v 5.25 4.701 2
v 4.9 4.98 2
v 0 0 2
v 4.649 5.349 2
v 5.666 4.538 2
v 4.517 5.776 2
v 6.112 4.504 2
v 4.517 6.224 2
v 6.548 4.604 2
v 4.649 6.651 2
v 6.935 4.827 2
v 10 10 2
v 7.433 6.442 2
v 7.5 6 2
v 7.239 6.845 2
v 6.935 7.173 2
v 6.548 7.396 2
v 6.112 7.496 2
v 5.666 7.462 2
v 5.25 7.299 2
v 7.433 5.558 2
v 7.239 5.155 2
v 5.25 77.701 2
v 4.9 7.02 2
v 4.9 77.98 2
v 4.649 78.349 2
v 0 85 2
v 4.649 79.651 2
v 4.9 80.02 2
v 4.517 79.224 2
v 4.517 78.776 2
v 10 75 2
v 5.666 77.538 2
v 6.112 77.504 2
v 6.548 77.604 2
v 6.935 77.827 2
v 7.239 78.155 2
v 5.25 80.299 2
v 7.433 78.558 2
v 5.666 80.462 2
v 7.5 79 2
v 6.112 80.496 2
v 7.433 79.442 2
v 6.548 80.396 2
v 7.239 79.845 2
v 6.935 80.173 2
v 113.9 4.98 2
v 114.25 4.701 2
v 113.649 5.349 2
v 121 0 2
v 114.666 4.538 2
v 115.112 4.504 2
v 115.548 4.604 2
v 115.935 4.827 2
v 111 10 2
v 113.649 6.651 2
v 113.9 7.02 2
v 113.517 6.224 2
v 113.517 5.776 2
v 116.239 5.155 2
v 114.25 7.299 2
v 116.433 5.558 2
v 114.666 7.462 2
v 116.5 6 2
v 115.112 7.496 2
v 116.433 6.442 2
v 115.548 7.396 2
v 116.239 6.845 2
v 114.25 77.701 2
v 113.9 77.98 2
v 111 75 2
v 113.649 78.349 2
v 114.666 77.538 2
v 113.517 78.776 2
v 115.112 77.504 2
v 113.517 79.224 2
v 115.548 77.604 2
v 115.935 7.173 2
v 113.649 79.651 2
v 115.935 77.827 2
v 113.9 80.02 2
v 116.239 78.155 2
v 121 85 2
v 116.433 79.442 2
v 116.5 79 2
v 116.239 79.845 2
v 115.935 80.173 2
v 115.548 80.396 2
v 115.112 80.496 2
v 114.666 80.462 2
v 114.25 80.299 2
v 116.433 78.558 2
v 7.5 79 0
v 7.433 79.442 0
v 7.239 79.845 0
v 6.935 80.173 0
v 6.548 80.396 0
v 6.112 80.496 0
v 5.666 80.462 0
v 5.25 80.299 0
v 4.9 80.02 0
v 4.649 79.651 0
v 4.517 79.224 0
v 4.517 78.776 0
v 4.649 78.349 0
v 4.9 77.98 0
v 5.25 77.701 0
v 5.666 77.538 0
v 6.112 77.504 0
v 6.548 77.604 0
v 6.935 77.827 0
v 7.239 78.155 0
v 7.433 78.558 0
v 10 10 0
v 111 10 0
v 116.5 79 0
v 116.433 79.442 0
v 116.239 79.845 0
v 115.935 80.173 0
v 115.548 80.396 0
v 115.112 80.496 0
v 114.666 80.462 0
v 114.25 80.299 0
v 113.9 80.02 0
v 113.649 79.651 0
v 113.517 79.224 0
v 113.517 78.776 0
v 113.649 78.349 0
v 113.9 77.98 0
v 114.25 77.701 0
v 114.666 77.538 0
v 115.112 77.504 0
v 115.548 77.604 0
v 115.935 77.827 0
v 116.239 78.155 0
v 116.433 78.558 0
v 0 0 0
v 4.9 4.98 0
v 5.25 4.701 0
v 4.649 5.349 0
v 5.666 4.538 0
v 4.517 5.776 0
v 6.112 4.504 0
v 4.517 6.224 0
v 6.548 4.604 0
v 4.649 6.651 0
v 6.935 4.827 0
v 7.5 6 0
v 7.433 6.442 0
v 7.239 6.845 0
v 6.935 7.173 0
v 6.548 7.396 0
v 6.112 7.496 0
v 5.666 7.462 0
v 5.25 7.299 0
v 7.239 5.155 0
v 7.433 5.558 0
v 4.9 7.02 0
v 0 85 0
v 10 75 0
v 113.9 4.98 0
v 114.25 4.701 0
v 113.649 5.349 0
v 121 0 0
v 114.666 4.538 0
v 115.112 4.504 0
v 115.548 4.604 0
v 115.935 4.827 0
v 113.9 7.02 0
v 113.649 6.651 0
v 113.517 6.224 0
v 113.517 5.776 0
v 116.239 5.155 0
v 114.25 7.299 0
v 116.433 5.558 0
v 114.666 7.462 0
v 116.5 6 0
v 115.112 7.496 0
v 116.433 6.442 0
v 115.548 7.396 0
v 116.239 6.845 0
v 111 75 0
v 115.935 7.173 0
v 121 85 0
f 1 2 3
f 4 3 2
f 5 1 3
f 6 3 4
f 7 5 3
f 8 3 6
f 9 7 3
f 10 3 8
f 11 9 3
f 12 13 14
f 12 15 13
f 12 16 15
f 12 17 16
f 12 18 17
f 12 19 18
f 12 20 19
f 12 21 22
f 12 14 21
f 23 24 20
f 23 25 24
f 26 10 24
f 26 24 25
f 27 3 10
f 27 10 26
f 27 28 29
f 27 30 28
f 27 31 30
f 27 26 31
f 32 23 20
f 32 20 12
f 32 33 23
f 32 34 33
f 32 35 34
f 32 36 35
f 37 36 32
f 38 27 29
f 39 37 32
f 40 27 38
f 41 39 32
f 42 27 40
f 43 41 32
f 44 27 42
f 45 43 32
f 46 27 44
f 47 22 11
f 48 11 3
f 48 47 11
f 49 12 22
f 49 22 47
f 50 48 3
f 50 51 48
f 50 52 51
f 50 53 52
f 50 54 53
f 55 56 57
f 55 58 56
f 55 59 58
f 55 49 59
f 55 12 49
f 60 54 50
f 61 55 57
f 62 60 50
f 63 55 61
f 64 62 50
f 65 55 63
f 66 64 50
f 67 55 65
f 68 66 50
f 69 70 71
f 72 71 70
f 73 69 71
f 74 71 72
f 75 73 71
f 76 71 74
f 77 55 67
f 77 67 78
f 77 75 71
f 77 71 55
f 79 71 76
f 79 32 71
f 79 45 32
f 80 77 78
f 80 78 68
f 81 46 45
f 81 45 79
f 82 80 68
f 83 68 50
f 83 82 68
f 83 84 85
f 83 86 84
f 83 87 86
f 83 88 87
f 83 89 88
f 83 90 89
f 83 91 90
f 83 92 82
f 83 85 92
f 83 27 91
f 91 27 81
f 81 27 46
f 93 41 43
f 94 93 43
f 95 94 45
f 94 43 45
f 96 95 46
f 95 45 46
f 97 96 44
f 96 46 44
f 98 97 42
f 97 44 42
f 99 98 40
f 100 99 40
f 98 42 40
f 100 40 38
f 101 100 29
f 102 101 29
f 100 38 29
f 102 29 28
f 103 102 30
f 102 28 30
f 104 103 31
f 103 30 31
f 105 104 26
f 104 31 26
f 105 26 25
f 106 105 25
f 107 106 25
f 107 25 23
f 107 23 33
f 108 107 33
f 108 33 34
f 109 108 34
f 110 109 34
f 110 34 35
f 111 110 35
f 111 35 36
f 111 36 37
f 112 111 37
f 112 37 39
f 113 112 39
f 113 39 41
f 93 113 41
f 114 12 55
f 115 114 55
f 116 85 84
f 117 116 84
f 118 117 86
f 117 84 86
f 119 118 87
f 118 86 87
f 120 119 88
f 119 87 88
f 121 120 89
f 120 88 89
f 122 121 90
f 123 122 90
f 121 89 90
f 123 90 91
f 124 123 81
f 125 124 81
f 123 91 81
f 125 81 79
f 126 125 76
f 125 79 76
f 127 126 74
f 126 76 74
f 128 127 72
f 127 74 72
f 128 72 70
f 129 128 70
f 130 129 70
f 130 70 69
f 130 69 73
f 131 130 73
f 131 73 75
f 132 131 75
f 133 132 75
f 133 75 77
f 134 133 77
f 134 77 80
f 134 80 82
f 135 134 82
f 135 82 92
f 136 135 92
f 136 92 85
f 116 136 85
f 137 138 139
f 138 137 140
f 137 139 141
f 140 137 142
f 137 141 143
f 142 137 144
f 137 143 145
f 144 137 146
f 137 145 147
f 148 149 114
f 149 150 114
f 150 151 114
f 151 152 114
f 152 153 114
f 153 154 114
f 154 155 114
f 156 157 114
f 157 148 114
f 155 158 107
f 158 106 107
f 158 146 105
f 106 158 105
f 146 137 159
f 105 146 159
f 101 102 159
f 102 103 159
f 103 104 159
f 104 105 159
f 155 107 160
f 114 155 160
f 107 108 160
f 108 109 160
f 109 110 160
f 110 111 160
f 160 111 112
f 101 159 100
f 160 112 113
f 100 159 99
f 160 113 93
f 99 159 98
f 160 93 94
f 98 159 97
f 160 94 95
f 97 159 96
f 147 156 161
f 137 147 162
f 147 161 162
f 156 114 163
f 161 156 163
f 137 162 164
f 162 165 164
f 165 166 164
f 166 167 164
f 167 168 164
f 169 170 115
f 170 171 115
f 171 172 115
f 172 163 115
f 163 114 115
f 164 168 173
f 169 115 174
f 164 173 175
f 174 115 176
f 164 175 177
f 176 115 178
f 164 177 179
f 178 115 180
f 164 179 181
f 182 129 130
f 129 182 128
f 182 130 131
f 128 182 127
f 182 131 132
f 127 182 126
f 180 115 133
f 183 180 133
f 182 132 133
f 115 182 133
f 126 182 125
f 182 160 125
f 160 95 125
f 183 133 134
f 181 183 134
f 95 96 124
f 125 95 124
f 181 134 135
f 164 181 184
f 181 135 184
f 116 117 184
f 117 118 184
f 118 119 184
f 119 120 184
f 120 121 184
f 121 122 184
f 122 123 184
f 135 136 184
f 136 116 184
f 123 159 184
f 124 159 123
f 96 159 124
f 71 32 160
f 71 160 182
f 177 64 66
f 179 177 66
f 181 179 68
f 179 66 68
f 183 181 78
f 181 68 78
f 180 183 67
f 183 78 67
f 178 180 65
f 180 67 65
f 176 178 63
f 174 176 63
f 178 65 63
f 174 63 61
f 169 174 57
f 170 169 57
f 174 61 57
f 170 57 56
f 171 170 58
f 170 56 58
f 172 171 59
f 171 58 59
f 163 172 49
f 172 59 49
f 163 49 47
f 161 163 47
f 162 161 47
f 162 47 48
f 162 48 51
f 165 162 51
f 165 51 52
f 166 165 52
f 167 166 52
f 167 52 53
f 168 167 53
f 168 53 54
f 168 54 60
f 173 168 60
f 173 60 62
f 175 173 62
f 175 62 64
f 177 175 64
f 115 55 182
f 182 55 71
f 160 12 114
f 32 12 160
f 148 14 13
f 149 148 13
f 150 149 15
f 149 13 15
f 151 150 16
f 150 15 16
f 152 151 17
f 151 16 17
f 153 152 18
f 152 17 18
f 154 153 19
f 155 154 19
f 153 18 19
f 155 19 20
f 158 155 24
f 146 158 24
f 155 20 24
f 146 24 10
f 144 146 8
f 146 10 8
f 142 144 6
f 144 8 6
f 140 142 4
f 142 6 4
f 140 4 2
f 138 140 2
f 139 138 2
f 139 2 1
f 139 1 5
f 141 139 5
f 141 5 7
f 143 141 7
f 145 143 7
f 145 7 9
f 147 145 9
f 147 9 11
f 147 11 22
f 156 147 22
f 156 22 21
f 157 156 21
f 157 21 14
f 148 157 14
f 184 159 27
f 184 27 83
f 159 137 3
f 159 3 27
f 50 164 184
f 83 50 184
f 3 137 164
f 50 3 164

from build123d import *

# Parameters (mm, degrees)
SKETCH1_W           = 121
SKETCH1_H           = 85
BOSS_EXTRUDE1_DEPTH = 2
SKETCH4_W           = 101
SKETCH4_H           = 65
CUT_EXTRUDE1_DEPTH  = 148.885090526
SKETCH5_R           = 1.5
CUT_EXTRUDE2_DEPTH  = 148.885090526


with BuildPart() as part:
    # Sketch1 → Boss-Extrude1 (new body)
    with BuildSketch(Plane.XY):
        with Locations((60.5, 42.5)):
            Rectangle(SKETCH1_W, SKETCH1_H)
    extrude(amount=BOSS_EXTRUDE1_DEPTH)

    # Sketch4 → Cut-Extrude1 (cut, through all)
    with BuildSketch(Plane.XY.offset(2)):
        with Locations((60.5, 42.5)):
            Rectangle(SKETCH4_W, SKETCH4_H)
    extrude(amount=-CUT_EXTRUDE1_DEPTH, mode=Mode.SUBTRACT)

    # Sketch5 → Cut-Extrude2 (cut, through all)
    with BuildSketch(Plane.XY.offset(2)):
        with Locations((6, 79)):
            Circle(SKETCH5_R)
        with Locations((115, 79)):
            Circle(SKETCH5_R)
        with Locations((6, 6)):
            Circle(SKETCH5_R)
        with Locations((115, 6)):
            Circle(SKETCH5_R)
    extrude(amount=-CUT_EXTRUDE2_DEPTH, mode=Mode.SUBTRACT)


solid = part.part
